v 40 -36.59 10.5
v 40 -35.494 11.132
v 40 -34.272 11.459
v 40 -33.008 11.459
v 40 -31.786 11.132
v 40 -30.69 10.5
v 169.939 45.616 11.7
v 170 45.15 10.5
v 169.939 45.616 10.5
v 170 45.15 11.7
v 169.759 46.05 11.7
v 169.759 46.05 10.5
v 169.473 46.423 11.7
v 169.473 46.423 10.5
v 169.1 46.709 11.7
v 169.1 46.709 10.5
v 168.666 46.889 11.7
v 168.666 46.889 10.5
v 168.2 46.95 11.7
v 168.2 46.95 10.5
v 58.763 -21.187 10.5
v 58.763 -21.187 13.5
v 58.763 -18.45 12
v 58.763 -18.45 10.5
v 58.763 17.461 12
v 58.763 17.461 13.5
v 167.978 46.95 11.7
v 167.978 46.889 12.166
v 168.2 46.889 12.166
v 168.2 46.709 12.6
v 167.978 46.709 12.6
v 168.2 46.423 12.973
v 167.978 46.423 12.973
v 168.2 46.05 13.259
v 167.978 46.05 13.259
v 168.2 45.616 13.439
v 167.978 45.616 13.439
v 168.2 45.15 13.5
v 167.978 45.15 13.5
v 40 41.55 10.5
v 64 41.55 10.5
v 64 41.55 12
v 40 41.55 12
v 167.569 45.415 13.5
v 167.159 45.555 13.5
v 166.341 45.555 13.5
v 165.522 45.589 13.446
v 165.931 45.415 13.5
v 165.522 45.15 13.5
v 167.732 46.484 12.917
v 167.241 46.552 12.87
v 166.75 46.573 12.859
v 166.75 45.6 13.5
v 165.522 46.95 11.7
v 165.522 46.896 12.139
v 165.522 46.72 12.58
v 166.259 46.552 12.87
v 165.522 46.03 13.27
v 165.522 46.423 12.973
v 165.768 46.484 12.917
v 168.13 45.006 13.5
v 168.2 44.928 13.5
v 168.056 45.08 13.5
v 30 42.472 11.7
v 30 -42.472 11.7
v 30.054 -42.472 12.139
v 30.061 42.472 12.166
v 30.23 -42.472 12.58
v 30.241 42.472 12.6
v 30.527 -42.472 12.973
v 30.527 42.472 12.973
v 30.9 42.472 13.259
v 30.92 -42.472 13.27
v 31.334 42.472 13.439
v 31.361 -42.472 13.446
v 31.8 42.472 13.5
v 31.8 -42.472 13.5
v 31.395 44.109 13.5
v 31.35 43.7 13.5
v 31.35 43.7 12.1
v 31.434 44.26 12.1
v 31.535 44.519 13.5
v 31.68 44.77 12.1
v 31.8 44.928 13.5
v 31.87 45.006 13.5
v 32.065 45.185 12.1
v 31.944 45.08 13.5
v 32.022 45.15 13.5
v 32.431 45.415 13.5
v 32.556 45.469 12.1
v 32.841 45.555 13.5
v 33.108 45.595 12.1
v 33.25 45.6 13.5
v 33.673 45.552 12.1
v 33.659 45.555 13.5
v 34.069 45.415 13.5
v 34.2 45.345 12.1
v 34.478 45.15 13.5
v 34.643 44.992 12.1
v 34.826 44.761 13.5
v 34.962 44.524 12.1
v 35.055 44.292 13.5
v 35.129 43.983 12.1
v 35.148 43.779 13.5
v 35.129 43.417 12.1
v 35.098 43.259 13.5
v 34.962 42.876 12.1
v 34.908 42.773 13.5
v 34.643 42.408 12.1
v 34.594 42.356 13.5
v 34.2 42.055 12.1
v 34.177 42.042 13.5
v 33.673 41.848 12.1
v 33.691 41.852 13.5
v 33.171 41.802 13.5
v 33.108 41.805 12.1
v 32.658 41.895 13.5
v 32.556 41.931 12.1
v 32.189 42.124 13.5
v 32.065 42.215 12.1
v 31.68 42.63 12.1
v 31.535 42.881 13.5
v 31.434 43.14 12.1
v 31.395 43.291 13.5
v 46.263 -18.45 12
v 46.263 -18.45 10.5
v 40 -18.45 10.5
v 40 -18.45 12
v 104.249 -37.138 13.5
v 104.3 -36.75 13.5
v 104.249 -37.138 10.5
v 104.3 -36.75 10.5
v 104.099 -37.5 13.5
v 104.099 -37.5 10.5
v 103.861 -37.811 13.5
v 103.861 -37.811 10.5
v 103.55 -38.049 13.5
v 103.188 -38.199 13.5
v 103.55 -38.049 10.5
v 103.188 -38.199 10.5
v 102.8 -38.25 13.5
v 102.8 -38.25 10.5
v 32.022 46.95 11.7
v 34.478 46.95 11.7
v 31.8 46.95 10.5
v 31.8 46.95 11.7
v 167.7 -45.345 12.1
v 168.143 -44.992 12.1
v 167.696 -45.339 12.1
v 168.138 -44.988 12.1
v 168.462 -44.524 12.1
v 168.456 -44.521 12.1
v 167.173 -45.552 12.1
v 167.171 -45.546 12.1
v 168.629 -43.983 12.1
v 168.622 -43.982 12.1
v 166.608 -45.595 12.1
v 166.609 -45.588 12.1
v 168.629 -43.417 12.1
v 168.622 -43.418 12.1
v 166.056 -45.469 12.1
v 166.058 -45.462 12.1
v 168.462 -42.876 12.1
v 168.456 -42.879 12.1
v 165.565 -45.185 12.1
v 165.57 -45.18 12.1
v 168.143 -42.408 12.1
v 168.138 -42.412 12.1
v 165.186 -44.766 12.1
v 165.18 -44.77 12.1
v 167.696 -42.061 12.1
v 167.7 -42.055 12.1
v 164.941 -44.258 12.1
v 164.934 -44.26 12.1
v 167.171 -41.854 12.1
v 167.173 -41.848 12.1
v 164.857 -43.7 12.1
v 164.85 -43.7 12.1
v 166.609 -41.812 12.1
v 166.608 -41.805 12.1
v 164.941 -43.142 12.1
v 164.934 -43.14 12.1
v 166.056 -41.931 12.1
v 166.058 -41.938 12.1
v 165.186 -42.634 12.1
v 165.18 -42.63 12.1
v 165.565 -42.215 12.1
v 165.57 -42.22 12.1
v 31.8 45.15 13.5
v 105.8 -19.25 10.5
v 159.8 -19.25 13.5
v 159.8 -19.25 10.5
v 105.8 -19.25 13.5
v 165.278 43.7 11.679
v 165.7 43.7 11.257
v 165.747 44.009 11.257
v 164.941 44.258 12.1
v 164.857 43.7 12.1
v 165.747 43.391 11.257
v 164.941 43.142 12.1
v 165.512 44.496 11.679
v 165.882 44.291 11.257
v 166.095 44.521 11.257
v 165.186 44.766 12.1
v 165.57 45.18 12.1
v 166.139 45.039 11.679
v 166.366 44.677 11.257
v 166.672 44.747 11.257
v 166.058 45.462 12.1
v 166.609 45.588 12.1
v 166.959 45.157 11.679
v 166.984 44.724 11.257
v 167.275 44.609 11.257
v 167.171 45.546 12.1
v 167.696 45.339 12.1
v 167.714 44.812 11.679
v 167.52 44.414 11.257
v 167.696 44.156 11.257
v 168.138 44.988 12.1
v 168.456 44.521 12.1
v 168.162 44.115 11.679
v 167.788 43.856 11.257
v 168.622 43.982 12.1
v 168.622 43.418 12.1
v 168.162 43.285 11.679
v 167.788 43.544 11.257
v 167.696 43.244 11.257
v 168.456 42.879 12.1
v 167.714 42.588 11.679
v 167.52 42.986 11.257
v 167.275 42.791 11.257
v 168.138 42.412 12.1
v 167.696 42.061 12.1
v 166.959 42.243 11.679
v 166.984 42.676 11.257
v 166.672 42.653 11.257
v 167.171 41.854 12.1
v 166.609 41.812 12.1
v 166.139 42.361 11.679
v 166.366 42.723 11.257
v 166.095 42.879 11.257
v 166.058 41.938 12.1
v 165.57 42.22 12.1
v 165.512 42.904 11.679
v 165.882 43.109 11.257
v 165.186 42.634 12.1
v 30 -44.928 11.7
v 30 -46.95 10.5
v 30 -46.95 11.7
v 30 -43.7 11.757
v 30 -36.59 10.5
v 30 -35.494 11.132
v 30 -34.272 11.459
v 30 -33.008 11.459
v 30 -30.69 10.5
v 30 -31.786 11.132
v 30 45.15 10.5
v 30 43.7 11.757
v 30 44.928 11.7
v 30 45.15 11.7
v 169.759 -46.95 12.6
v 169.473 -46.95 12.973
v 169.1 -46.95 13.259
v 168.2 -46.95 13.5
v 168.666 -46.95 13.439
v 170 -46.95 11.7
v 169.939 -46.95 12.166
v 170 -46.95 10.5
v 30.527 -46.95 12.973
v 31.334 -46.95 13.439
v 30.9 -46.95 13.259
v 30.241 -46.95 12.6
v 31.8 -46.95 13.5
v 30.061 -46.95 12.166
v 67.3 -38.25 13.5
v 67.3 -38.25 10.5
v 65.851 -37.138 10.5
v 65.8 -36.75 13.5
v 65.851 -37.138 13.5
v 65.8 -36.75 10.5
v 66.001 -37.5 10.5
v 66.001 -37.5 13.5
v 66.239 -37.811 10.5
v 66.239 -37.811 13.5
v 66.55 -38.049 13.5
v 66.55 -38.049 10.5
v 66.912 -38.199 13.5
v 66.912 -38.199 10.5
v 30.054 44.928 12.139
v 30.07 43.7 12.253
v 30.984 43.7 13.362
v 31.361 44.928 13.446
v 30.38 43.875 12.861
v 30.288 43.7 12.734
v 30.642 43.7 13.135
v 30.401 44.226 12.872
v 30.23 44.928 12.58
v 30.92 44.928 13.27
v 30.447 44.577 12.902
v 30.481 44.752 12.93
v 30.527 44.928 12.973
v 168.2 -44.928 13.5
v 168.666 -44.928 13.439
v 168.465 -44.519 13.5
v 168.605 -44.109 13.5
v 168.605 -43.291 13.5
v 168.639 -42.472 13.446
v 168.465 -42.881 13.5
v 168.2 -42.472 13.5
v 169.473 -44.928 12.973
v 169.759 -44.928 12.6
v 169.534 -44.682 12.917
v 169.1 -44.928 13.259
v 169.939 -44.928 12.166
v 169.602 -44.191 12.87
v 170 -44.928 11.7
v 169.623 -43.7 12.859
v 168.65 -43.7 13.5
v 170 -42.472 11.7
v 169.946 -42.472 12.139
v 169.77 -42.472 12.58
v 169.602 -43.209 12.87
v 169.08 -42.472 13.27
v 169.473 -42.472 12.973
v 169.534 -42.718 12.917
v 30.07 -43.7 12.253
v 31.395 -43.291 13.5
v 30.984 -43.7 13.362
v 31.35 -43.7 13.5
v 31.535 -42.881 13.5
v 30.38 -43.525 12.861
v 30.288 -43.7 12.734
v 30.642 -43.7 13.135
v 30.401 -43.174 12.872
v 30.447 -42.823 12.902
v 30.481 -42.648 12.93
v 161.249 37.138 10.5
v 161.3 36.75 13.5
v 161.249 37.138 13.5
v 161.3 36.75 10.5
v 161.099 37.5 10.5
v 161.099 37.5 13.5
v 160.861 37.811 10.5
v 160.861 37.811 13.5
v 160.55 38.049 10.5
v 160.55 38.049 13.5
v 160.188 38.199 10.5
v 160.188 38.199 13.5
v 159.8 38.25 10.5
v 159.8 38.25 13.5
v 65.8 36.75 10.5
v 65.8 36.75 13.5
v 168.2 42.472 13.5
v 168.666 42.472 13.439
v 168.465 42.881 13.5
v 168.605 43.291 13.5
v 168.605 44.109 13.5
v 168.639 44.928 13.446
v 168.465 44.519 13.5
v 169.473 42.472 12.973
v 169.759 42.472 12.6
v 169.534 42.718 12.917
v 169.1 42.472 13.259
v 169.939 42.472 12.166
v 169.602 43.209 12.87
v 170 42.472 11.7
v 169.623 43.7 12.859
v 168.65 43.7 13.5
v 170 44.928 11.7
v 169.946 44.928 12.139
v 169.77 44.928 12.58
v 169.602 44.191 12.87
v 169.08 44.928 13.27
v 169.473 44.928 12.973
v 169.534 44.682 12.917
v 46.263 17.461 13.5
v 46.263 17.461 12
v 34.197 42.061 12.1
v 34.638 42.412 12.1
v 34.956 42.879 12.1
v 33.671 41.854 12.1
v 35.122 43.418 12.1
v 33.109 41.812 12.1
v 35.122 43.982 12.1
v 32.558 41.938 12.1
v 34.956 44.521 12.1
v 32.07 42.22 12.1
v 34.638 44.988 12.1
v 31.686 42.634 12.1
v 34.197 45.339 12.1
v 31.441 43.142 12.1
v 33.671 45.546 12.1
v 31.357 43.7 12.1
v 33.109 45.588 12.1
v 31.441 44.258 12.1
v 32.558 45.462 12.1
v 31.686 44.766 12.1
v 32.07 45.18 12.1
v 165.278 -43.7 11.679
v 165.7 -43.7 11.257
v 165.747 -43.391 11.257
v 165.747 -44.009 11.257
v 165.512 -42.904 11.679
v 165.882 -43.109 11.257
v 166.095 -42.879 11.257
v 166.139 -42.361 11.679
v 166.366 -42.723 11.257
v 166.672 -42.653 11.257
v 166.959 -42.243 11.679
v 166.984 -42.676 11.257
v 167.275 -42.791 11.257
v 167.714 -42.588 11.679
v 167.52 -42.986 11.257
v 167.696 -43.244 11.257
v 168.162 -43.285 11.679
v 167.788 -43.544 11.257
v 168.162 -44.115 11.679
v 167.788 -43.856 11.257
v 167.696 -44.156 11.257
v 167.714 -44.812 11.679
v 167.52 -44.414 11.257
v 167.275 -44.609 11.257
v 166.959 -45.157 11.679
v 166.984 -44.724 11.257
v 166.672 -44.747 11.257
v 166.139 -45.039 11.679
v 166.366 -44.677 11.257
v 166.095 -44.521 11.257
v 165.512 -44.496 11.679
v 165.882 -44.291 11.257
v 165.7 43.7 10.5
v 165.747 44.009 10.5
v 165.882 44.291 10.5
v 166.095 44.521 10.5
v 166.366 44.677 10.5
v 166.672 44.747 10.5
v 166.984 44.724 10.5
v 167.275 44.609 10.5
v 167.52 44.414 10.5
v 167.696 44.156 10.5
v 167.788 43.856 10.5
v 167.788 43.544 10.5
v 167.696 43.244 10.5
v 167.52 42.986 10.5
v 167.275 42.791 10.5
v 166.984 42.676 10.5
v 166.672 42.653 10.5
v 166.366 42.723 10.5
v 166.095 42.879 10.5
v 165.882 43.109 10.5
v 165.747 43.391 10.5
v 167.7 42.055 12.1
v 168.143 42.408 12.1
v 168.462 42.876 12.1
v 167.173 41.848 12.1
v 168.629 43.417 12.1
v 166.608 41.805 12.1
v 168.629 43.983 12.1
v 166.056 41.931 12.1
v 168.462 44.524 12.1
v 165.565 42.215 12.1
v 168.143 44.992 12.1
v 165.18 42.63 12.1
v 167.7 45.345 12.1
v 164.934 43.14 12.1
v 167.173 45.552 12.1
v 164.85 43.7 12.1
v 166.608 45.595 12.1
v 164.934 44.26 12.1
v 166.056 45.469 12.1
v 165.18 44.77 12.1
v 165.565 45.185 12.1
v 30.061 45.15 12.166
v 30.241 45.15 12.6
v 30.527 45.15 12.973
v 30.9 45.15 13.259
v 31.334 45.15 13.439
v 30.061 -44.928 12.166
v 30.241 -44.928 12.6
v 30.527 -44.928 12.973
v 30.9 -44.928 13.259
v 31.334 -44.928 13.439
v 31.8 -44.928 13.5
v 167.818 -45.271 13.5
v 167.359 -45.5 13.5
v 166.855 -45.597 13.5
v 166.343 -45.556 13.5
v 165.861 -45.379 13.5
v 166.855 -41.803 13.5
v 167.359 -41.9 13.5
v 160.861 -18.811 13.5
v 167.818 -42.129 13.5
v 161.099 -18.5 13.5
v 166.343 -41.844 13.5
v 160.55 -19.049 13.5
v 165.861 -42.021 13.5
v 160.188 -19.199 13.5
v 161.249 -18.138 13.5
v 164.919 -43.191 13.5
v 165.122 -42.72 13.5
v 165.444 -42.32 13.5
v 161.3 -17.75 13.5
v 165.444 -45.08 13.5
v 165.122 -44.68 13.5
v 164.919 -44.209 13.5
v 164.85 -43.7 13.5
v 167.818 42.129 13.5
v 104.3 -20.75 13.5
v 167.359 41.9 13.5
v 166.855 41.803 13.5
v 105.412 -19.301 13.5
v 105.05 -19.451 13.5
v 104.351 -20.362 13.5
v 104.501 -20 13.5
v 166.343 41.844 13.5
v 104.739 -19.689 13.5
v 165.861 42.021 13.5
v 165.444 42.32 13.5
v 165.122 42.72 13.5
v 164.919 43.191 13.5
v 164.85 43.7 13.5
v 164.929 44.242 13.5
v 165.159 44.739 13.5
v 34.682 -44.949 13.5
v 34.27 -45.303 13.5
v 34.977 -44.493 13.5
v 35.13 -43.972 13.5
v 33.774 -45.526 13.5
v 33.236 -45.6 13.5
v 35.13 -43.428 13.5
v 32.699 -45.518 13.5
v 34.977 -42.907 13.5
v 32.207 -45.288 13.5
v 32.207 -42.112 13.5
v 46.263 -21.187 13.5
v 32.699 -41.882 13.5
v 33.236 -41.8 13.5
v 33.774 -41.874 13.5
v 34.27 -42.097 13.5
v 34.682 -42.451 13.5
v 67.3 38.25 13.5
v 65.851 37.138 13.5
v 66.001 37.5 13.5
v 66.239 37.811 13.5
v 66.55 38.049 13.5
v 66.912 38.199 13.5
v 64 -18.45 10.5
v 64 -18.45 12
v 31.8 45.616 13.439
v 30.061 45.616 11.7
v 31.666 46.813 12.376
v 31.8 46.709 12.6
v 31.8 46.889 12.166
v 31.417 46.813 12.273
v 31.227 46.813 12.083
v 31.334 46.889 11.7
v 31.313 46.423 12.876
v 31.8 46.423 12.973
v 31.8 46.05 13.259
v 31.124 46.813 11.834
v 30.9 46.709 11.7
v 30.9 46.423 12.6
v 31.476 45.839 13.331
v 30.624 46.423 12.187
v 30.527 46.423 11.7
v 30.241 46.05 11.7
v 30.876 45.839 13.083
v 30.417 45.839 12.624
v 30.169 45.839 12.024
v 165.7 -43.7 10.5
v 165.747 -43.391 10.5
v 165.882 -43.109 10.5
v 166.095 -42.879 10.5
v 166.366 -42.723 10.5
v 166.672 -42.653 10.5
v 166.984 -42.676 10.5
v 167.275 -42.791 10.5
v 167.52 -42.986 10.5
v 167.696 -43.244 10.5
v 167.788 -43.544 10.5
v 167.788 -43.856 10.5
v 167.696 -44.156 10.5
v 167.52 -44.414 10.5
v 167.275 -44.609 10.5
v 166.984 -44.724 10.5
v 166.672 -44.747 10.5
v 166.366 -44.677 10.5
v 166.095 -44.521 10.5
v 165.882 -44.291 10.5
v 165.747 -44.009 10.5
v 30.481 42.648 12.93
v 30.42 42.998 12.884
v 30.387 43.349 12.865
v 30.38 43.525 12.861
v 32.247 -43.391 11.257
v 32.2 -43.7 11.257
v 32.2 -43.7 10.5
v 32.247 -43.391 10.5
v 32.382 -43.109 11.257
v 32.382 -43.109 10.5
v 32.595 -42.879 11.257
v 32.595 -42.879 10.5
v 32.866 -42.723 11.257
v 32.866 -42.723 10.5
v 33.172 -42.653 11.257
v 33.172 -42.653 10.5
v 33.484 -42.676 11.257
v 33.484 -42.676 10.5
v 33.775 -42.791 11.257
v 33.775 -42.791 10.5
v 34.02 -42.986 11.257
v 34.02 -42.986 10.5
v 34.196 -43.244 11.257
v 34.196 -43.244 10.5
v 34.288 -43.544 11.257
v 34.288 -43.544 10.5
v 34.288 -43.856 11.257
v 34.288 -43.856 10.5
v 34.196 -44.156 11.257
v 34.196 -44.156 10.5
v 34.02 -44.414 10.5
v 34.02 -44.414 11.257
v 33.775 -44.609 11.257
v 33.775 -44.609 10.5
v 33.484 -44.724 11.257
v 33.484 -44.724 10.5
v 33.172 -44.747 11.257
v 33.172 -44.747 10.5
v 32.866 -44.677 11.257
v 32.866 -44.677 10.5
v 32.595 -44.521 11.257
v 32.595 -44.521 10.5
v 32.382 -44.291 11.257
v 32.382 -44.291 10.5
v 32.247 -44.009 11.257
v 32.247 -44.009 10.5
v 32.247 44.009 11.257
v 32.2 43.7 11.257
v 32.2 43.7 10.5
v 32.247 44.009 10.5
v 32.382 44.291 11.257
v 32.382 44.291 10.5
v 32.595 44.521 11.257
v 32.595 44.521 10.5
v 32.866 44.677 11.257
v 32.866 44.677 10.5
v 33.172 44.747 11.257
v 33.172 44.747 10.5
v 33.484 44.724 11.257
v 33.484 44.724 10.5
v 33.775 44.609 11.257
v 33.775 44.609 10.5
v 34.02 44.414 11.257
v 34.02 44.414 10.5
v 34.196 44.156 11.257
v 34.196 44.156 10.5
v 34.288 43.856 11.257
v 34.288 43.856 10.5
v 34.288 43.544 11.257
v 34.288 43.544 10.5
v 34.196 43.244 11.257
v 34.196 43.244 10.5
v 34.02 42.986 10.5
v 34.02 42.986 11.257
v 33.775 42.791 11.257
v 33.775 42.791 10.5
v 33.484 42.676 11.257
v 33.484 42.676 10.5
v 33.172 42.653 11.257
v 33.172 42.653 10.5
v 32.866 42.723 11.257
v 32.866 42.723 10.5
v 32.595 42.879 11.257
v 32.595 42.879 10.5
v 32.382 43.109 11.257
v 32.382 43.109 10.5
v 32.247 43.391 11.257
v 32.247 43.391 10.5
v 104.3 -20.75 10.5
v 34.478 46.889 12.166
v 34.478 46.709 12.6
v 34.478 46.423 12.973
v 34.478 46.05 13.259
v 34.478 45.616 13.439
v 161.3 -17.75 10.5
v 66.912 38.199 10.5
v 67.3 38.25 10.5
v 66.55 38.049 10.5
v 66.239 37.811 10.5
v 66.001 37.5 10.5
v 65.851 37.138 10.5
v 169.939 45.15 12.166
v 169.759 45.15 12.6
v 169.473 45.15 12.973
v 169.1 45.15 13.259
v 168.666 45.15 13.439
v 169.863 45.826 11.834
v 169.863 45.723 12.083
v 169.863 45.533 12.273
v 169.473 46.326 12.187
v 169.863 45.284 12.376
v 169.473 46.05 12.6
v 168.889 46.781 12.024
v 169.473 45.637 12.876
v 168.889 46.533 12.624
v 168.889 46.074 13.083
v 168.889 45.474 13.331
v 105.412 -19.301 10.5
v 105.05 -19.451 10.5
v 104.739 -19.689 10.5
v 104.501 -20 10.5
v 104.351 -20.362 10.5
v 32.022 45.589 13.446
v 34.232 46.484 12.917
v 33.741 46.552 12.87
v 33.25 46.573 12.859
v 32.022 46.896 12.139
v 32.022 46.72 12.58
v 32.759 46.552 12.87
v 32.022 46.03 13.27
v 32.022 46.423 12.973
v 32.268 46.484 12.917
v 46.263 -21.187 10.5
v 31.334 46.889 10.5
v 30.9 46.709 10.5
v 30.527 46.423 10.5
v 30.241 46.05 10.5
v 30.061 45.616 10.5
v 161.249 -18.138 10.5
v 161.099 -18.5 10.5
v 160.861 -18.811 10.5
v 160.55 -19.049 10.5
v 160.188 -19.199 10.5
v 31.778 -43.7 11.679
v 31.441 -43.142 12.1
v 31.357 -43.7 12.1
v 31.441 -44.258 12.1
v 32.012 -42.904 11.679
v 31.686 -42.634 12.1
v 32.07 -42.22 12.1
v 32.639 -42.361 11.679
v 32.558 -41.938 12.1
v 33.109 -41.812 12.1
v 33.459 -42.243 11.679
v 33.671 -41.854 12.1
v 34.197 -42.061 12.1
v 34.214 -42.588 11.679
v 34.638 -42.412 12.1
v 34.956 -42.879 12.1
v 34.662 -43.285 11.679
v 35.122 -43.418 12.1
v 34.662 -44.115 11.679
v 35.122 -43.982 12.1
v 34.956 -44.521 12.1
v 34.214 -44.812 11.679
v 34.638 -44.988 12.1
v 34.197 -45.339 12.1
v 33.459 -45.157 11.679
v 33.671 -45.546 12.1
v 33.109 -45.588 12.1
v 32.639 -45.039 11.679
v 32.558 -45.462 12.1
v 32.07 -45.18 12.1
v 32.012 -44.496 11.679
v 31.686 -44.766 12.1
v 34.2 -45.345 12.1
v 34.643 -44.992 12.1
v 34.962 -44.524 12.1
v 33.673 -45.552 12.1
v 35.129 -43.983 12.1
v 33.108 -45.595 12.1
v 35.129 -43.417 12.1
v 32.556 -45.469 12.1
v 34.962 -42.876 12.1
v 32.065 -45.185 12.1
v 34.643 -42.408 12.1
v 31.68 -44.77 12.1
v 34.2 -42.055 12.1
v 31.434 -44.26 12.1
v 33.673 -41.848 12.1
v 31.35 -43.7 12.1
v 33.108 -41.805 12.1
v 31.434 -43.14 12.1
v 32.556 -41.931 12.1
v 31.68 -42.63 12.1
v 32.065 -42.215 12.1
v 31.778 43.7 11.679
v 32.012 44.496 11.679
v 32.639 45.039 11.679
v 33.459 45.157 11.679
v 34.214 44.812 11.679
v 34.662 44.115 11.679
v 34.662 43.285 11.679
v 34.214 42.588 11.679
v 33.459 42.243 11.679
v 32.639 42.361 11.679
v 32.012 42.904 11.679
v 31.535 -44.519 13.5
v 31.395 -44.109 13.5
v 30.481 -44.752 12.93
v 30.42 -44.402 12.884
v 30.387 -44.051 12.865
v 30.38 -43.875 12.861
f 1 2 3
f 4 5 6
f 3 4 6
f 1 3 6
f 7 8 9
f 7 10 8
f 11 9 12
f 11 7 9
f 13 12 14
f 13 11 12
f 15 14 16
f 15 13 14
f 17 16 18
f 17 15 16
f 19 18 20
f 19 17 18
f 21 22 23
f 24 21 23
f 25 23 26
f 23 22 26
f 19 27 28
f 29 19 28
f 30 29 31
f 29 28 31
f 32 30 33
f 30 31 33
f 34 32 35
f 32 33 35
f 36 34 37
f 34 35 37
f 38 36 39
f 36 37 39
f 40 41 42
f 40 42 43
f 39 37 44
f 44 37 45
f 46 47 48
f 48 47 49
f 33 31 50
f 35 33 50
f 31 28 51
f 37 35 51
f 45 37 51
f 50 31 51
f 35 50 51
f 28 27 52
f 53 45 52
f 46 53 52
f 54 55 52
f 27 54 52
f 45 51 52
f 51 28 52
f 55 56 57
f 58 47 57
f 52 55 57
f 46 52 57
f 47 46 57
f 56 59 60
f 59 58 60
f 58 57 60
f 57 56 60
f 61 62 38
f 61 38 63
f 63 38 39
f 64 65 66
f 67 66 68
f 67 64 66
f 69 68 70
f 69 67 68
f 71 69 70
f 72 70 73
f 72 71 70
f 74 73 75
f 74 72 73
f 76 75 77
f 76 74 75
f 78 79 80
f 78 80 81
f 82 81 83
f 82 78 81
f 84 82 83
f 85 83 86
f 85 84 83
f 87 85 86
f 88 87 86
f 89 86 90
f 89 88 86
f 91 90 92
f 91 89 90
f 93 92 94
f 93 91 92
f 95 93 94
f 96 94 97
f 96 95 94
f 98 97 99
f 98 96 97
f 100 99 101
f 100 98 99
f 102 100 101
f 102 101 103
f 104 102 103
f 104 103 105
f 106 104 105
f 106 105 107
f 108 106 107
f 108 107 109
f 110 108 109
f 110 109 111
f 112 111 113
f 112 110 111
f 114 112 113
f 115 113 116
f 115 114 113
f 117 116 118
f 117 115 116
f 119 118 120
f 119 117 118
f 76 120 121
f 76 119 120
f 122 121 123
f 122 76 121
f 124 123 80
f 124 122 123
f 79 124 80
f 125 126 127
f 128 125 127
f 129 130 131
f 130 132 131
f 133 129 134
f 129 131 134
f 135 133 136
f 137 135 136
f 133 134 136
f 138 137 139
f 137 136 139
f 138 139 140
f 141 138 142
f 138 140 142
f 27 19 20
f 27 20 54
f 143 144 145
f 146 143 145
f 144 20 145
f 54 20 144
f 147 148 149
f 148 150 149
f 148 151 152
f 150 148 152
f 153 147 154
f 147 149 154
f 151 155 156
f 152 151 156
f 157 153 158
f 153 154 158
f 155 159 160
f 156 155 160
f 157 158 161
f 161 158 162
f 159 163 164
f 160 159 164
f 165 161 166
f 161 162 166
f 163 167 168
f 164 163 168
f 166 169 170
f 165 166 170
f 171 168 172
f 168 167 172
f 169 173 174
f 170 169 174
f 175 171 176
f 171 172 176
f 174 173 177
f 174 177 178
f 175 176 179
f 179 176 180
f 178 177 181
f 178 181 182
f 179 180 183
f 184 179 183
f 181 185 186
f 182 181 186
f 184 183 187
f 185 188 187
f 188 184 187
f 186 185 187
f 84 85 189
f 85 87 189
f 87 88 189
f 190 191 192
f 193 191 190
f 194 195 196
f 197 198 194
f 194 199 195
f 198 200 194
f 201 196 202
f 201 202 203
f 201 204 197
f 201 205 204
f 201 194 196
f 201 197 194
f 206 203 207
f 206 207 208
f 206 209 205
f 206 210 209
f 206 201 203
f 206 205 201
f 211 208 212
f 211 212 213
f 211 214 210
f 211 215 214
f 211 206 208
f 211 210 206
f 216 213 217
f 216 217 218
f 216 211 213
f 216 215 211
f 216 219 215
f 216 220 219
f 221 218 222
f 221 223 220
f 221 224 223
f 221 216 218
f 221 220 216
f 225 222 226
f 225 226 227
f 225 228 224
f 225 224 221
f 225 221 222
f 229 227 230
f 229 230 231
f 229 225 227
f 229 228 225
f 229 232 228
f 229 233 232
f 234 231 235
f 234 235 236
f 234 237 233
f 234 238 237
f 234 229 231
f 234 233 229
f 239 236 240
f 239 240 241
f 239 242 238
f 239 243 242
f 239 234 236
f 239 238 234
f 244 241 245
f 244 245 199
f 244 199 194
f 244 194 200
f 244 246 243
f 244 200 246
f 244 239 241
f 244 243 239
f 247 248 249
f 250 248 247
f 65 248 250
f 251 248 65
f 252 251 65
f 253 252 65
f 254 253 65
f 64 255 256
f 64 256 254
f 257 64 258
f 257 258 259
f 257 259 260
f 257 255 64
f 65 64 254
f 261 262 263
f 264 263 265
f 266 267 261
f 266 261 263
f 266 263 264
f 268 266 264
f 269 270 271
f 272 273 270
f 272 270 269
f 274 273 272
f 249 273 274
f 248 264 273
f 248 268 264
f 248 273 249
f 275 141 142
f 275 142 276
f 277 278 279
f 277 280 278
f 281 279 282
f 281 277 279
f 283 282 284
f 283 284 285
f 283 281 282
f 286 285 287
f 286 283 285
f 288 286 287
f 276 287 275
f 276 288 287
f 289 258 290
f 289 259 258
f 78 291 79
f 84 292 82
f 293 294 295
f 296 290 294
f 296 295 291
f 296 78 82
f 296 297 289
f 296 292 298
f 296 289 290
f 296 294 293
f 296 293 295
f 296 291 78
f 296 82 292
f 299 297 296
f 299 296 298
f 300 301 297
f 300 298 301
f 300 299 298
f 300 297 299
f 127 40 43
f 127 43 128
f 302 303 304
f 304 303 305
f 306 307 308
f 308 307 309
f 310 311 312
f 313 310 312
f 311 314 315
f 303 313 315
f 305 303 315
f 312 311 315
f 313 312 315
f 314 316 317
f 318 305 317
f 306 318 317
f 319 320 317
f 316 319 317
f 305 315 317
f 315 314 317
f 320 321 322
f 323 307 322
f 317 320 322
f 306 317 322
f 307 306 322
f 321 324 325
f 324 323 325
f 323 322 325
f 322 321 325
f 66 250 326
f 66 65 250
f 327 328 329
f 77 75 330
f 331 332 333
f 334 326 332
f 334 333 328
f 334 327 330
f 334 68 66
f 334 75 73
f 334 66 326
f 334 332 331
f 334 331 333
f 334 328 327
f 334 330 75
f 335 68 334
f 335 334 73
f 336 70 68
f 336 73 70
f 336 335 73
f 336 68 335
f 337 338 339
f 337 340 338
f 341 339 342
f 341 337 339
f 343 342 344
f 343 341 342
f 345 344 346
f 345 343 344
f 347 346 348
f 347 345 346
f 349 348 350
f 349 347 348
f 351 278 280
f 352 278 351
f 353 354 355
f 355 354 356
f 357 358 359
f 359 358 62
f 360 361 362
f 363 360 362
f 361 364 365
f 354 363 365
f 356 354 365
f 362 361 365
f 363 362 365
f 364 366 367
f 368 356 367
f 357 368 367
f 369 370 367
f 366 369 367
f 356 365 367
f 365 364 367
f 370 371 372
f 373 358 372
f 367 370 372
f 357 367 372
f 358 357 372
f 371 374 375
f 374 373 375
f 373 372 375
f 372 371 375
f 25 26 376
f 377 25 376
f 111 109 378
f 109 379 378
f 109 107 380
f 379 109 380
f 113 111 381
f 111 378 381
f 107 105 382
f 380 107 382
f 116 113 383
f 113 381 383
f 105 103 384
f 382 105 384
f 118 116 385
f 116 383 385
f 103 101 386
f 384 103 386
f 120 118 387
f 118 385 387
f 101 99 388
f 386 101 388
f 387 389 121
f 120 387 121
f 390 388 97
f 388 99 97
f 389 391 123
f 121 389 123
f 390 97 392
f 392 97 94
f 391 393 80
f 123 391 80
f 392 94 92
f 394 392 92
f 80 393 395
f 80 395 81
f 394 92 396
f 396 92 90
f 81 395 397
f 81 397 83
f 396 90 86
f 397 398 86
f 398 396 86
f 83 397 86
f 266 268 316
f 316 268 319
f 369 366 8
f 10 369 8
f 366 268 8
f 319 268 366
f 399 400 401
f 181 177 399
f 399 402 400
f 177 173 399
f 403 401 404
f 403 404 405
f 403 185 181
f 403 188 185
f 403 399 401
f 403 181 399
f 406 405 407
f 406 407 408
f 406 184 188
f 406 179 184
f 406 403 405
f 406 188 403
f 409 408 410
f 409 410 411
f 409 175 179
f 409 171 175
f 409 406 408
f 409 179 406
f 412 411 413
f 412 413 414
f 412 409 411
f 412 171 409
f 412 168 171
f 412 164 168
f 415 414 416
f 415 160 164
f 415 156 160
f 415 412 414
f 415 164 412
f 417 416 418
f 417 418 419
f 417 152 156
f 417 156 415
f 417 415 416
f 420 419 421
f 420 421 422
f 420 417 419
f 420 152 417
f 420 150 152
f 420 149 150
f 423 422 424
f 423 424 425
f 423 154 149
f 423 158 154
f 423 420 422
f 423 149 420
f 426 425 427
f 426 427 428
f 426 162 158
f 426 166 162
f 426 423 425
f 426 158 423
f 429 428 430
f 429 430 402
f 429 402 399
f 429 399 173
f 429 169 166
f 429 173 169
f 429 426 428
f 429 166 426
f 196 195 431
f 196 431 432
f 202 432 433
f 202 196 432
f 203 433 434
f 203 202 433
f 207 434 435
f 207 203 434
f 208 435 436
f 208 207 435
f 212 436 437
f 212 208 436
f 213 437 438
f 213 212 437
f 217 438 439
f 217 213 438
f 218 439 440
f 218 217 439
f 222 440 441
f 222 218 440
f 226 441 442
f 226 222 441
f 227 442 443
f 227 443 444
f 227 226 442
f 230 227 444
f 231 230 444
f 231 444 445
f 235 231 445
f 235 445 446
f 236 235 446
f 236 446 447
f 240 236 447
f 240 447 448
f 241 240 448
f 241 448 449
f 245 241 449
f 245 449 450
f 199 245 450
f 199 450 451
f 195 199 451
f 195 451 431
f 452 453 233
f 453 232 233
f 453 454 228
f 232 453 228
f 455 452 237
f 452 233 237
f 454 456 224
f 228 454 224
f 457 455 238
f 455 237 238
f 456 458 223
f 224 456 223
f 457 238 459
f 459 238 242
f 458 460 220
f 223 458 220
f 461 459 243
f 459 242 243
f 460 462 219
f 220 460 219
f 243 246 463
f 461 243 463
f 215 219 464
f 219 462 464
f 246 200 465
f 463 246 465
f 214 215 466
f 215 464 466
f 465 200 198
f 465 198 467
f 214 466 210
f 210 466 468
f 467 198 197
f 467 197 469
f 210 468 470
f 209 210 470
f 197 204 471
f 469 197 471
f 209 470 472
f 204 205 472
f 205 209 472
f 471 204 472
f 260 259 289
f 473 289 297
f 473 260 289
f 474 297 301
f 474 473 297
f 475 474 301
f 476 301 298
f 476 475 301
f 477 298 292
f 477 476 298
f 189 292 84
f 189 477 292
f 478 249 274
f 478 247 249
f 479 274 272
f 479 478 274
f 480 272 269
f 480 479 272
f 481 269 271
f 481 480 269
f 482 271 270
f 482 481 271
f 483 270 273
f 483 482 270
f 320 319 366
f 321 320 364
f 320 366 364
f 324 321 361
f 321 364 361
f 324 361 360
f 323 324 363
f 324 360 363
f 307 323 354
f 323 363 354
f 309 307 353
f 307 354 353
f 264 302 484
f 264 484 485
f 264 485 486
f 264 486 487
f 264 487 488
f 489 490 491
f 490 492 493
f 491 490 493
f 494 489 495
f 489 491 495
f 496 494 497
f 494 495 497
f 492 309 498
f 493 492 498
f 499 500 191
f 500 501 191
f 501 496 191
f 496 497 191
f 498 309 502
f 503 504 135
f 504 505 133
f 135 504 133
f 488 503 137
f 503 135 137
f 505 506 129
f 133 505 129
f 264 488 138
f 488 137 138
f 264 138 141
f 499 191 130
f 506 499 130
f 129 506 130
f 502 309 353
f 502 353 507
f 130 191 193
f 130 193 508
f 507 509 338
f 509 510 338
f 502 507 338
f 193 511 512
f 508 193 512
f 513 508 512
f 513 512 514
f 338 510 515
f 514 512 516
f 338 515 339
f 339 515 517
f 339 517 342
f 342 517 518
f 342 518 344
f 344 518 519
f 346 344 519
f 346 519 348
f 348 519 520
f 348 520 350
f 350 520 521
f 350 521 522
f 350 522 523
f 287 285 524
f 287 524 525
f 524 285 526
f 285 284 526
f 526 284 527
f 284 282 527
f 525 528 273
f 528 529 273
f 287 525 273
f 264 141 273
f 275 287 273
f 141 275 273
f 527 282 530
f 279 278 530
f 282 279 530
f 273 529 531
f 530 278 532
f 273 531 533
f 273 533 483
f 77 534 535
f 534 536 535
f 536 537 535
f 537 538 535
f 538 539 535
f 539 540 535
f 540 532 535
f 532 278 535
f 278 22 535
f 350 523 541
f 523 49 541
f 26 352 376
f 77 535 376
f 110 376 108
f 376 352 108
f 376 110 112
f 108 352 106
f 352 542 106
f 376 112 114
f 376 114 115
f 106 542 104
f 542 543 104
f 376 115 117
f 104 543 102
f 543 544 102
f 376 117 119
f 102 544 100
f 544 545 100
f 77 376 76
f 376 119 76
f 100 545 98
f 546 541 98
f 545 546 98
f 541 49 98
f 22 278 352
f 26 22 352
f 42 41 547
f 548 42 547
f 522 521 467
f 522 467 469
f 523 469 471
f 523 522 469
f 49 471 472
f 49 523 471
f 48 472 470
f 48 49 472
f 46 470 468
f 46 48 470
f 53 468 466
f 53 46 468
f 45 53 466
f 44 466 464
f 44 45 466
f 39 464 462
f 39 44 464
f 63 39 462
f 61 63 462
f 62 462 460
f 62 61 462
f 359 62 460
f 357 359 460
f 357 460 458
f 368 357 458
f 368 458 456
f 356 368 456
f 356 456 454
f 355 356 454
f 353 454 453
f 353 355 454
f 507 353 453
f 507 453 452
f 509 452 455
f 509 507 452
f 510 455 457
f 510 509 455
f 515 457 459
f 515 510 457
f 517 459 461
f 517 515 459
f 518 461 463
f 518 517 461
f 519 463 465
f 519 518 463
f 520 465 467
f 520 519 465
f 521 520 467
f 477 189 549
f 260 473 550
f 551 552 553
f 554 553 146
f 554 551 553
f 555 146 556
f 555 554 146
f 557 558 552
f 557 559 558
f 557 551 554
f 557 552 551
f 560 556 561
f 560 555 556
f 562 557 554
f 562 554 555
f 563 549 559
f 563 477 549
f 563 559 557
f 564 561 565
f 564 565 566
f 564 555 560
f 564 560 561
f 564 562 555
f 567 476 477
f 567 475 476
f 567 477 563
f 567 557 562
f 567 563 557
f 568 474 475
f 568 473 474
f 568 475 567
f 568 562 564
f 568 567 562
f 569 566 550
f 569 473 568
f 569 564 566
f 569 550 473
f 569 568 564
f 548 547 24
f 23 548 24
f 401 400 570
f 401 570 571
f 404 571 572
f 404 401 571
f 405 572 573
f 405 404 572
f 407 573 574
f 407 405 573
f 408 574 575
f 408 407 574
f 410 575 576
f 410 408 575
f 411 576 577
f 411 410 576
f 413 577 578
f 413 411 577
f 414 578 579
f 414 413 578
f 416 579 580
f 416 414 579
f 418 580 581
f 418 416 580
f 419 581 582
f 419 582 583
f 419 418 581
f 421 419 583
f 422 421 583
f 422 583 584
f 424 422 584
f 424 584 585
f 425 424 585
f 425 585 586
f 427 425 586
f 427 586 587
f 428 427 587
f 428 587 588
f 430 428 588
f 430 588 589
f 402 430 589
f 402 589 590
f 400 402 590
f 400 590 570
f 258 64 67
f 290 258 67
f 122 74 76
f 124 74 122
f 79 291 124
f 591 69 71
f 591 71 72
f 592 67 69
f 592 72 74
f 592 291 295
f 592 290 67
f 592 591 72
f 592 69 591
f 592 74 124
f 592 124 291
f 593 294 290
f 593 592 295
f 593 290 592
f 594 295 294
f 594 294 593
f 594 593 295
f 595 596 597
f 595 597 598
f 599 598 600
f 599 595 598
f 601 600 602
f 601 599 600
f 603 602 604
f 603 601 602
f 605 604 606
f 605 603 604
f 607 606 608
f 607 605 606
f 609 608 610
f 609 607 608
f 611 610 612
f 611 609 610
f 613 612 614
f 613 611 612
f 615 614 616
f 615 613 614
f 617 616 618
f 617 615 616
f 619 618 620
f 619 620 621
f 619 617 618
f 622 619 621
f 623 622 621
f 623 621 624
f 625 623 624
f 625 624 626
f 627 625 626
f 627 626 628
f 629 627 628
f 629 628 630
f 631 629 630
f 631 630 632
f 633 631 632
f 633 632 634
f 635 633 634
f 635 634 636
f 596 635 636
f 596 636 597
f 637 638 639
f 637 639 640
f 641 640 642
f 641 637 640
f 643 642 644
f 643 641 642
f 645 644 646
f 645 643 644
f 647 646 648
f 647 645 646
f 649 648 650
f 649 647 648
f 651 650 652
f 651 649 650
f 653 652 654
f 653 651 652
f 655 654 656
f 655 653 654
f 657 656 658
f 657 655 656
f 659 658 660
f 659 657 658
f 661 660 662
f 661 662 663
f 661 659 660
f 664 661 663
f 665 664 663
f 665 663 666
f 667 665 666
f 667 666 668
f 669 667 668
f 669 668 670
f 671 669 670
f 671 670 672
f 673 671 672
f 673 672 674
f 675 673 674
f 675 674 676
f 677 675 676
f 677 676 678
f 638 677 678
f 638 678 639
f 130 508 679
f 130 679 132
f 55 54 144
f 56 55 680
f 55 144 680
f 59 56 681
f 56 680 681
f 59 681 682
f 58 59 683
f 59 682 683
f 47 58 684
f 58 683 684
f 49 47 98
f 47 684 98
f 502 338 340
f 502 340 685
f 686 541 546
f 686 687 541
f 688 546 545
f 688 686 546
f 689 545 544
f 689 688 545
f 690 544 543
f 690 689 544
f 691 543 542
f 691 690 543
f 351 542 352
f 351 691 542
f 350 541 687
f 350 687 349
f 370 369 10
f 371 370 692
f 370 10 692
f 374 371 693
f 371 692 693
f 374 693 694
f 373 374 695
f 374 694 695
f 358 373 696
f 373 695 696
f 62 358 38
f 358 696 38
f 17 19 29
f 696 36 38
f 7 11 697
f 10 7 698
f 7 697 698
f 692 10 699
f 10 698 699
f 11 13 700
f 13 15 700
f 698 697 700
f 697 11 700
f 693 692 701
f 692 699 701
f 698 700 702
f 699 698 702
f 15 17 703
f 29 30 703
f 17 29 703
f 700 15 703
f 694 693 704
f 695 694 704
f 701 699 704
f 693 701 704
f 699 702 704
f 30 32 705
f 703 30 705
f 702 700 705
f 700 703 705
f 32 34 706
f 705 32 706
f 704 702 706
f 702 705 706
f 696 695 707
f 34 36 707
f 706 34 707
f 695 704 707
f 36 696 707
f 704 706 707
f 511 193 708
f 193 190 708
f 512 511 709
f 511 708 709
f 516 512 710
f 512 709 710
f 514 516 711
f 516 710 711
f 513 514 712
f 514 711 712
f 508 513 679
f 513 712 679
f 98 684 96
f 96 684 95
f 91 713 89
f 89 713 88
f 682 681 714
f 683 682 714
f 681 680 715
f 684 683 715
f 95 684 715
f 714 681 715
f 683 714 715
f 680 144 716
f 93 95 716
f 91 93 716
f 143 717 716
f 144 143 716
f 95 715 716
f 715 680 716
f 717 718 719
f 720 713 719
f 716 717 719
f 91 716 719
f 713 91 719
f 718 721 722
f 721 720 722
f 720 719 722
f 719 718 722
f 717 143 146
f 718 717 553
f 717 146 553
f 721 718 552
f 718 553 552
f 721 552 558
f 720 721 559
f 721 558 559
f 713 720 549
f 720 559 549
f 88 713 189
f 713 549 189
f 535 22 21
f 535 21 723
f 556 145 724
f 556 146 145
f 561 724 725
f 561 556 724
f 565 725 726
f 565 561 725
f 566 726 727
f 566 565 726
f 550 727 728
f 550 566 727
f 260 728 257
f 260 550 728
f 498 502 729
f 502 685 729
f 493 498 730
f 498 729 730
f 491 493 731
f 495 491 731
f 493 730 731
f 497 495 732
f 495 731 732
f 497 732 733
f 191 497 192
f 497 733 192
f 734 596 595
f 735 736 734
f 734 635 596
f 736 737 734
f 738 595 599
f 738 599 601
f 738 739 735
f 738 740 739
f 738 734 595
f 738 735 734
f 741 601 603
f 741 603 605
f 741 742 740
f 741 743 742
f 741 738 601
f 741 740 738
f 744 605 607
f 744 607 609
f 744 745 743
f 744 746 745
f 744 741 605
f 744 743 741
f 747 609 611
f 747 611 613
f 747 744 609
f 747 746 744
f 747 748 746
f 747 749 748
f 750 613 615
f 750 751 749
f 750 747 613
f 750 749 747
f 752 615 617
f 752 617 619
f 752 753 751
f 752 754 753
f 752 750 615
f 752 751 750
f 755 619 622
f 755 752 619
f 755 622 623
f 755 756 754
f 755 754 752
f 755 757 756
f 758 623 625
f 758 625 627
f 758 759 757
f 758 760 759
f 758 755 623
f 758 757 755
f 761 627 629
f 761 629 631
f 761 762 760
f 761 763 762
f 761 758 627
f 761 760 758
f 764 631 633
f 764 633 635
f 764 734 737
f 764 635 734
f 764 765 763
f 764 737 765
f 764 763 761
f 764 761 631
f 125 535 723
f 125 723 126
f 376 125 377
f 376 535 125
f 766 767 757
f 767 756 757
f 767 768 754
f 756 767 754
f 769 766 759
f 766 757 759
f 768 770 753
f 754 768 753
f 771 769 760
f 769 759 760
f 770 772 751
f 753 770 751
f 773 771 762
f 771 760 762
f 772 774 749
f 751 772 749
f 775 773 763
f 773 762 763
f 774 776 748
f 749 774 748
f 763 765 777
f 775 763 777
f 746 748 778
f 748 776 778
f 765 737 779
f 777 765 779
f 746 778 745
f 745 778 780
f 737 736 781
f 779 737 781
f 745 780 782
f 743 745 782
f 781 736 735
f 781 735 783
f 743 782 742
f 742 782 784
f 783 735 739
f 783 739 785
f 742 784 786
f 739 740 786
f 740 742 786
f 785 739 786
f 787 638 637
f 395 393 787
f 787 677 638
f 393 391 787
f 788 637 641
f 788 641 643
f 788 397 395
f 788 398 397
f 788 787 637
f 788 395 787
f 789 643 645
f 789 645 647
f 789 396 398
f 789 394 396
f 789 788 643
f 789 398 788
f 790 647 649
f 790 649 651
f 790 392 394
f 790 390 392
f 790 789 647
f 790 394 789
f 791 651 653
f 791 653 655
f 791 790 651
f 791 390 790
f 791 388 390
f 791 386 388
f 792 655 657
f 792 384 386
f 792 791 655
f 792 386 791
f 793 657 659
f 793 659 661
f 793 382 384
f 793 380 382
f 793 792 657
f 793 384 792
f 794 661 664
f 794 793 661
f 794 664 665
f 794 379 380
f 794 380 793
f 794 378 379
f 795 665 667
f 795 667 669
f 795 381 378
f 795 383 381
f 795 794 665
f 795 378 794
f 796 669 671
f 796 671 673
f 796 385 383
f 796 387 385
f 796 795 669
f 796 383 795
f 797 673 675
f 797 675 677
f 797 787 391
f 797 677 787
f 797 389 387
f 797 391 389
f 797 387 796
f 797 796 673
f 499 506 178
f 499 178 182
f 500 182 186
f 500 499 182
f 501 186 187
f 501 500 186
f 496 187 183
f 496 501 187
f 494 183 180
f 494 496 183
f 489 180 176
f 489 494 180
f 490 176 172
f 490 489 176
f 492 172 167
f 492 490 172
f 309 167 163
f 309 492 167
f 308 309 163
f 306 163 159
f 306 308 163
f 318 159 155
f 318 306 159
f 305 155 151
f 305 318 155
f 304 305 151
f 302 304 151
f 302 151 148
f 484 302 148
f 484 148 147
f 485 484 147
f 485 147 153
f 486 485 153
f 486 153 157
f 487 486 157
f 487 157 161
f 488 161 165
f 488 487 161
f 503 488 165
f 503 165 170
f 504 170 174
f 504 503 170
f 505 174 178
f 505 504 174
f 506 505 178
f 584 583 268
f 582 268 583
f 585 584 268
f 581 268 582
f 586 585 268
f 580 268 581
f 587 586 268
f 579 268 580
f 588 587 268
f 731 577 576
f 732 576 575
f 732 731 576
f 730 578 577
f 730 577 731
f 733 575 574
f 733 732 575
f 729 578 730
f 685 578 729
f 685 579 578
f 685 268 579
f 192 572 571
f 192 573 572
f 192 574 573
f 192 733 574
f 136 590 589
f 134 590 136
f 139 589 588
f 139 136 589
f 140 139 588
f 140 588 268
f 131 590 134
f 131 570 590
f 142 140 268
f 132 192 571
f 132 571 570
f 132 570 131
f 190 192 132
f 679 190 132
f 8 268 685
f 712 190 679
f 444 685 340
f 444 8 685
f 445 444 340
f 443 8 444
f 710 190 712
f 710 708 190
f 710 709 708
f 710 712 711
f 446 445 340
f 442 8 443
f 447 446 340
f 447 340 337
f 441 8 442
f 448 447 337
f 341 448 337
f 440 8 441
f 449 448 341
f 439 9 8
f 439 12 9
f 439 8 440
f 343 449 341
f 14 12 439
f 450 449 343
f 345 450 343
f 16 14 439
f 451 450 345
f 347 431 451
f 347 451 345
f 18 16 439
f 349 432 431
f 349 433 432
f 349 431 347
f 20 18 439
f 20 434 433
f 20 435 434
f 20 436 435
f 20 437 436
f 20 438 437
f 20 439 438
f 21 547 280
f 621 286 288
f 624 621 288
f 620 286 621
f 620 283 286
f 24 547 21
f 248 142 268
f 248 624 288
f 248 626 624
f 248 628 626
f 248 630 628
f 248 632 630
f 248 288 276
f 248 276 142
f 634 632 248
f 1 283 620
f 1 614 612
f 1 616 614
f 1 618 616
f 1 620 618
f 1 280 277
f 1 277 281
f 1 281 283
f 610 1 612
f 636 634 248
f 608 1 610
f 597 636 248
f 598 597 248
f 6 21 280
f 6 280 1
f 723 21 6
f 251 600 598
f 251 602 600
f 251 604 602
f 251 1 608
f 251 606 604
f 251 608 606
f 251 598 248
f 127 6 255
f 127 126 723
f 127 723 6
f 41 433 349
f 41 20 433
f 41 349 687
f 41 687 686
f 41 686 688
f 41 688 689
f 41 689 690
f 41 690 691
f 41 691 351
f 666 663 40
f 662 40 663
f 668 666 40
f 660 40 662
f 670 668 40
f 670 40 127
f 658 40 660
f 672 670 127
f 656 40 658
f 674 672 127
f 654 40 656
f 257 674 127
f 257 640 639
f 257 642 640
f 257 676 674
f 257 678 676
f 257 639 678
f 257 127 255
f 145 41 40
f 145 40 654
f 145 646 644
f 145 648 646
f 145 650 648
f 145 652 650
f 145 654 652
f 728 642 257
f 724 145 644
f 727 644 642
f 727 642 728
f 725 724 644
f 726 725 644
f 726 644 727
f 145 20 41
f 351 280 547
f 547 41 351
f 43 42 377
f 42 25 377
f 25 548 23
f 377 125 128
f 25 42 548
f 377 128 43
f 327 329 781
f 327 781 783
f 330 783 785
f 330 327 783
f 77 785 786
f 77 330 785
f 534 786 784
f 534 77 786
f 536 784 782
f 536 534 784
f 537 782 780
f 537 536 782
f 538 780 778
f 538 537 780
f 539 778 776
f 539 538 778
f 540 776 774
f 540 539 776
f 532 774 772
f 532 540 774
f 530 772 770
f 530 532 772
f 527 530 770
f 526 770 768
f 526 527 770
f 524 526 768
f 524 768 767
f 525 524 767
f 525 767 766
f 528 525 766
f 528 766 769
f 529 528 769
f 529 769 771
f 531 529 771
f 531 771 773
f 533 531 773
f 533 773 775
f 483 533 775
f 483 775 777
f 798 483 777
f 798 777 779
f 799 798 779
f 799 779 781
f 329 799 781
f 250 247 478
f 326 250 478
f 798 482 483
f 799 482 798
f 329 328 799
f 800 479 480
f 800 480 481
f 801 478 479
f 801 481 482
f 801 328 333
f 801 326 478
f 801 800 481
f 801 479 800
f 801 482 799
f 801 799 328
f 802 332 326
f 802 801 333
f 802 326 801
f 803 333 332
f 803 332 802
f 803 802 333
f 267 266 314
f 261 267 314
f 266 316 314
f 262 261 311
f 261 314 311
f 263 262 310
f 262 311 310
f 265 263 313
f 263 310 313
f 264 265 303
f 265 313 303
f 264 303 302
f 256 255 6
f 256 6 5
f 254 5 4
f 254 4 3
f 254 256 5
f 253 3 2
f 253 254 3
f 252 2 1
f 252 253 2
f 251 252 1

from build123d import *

# Parameters (mm, degrees)
SKETCH057_W                       = 140
SKETCH057_H                       = 93.9
PAD006_DEPTH                      = 3
SKETCH058_W                       = 12.5
SKETCH058_H                       = 38.6472
POCKET043_DEPTH                   = 3
SKETCH059_W                       = 24
SKETCH059_H                       = 60
POCKET044_DEPTH                   = 1.5
SKETCH060_R                       = 1.05
POCKET045_DEPTH                   = 3.001
SKETCH061_R                       = 1.9
POCKET046_DEPTH                   = 1.4
CHAMFER002_1_ANGLE                = 45
CHAMFER002_1_SIZE                 = 0.843
CHAMFER002_2_ANGLE                = 45
CHAMFER002_2_SIZE                 = 0.843
CHAMFER002_3_ANGLE                = 45
CHAMFER002_3_SIZE                 = 0.843
CHAMFER002_4_ANGLE                = 45
CHAMFER002_4_SIZE                 = 0.843
FILLET007_R                       = 1.5
SKETCH062_R                       = 4.85
POCKET047_DEPTH                   = 10
FILLET008_R                       = 1.8
BODY005_PLACEMENT_ANGLE           = 180
PART_MIRRORING001_PLACEMENT_ANGLE = 180


with BuildPart() as top002:
    # Sketch057 (on XY_Plane154 of Origin626) → Pad006 (new body)
    with BuildSketch(Plane.XY):
        Rectangle(SKETCH057_W, SKETCH057_H)
    extrude(amount=PAD006_DEPTH)

    # Sketch058 (on Face6 of Pad006) → Pocket043 (cut)
    with BuildSketch(Plane.XY.offset(3)):
        Polygon((-61.3, 38.25), (-61.3, -19.25), (-4.3, -19.25), (-4.3, -38.25), (34.2, -38.25), (34.2, 38.25), align=None)
        with Locations((47.48708, -1.86296)):
            Rectangle(SKETCH058_W, SKETCH058_H)
    extrude(amount=-POCKET043_DEPTH, mode=Mode.SUBTRACT)

    # Sketch059 (on Face4 of Pocket043) → Pocket044 (cut)
    with BuildSketch(Plane(origin=(0, 0, 0), x_dir=(1, 0, 0), z_dir=(0, 0, -1))):
        with Locations((48, -11.55)):
            Rectangle(SKETCH059_W, SKETCH059_H)
    extrude(amount=-POCKET044_DEPTH, mode=Mode.SUBTRACT)

    # Sketch060 (on Face5 of Pocket044) → Pocket045 (cut, through all)
    with BuildSketch(Plane.XY.offset(3)):
        with Locations((66.75, 43.7)):
            Circle(SKETCH060_R)
        with Locations((66.75, -43.7)):
            Circle(SKETCH060_R)
        with Locations((-66.75, -43.7)):
            Circle(SKETCH060_R)
        with Locations((-66.75, 43.7)):
            Circle(SKETCH060_R)
    extrude(amount=-POCKET045_DEPTH, mode=Mode.SUBTRACT)

    # Sketch061 (on Face5 of Pocket045) → Pocket046 (cut)
    with BuildSketch(Plane.XY.offset(3)):
        with Locations((-66.75, 43.7)):
            Circle(SKETCH061_R)
        with Locations((66.75, 43.7)):
            Circle(SKETCH061_R)
        with Locations((-66.75, -43.7)):
            Circle(SKETCH061_R)
        with Locations((66.75, -43.7)):
            Circle(SKETCH061_R)
    extrude(amount=-POCKET046_DEPTH, mode=Mode.SUBTRACT)

    # Chamfer002 1
    chamfer002_1_edges = [top002.edges().sort_by_distance(p)[0] for p in [
        (-67.8, 43.7, 1.6),
    ]]
    chamfer002_1_side = top002.faces().sort_by_distance((-67.8, 43.7, 0.8))[0]
    chamfer(chamfer002_1_edges, length=CHAMFER002_1_SIZE, angle=CHAMFER002_1_ANGLE, reference=chamfer002_1_side)

    # Chamfer002 2
    chamfer002_2_edges = [top002.edges().sort_by_distance(p)[0] for p in [
        (65.7, -43.7, 1.6),
    ]]
    chamfer002_2_side = top002.faces().sort_by_distance((65.7, -43.7, 0.8))[0]
    chamfer(chamfer002_2_edges, length=CHAMFER002_2_SIZE, angle=CHAMFER002_2_ANGLE, reference=chamfer002_2_side)

    # Chamfer002 3
    chamfer002_3_edges = [top002.edges().sort_by_distance(p)[0] for p in [
        (-67.8, -43.7, 1.6),
    ]]
    chamfer002_3_side = top002.faces().sort_by_distance((-67.8, -43.7, 0.8))[0]
    chamfer(chamfer002_3_edges, length=CHAMFER002_3_SIZE, angle=CHAMFER002_3_ANGLE, reference=chamfer002_3_side)

    # Chamfer002 4
    chamfer002_4_edges = [top002.edges().sort_by_distance(p)[0] for p in [
        (65.7, 43.7, 1.6),
    ]]
    chamfer002_4_side = top002.faces().sort_by_distance((65.7, 43.7, 0.8))[0]
    chamfer(chamfer002_4_edges, length=CHAMFER002_4_SIZE, angle=CHAMFER002_4_ANGLE, reference=chamfer002_4_side)

    # Fillet007
    fillet007_edges = [top002.edges().sort_by_distance(p)[0] for p in [
        (-4.3, -38.25, 1.5),
        (34.2, -38.25, 1.5),
        (34.2, 38.25, 1.5),
        (-61.3, 38.25, 1.5),
        (-61.3, -19.25, 1.5),
        (-4.3, -19.25, 1.5),
    ]]
    fillet(fillet007_edges, radius=FILLET007_R)

    # Sketch062 (on Face16 of Fillet007) → Pocket047 (cut)
    with BuildSketch(Plane.YZ.offset(70)):
        with Locations((-33.64, -3.85)):
            Circle(SKETCH062_R)
    extrude(amount=-POCKET047_DEPTH, mode=Mode.SUBTRACT)

    # Fillet008
    fillet008_edges = [top002.edges().sort_by_distance(p)[0] for p in [
        (70, 0, 3),
        (0, 46.95, 3),
        (70, 46.95, 1.5),
        (-70, 46.95, 1.5),
        (-70, 0, 3),
    ]]
    fillet(fillet008_edges, radius=FILLET008_R)


with BuildPart() as top002_1:
    # Body005 placement: moved
    add(top002.part.moved(Location((150, 0, 2.9))).rotate(Axis((150, 0, 2.9), (0, 1, 0)), BODY005_PLACEMENT_ANGLE))


with BuildPart() as part_mirroring001:
    # Part__Mirroring001: instance of Top002
    add(top002_1.part.mirror(Plane(origin=(0, 0, 0), x_dir=(0, -1, 0), z_dir=(1, 0, 0))))


with BuildPart() as part_mirroring001_1:
    # Part__Mirroring001 placement: moved
    add(part_mirroring001.part.moved(Location((-50, 0, 13.4))).rotate(Axis((-50, 0, 13.4), (0, 1, 0)), PART_MIRRORING001_PLACEMENT_ANGLE))


solid = part_mirroring001_1.part
